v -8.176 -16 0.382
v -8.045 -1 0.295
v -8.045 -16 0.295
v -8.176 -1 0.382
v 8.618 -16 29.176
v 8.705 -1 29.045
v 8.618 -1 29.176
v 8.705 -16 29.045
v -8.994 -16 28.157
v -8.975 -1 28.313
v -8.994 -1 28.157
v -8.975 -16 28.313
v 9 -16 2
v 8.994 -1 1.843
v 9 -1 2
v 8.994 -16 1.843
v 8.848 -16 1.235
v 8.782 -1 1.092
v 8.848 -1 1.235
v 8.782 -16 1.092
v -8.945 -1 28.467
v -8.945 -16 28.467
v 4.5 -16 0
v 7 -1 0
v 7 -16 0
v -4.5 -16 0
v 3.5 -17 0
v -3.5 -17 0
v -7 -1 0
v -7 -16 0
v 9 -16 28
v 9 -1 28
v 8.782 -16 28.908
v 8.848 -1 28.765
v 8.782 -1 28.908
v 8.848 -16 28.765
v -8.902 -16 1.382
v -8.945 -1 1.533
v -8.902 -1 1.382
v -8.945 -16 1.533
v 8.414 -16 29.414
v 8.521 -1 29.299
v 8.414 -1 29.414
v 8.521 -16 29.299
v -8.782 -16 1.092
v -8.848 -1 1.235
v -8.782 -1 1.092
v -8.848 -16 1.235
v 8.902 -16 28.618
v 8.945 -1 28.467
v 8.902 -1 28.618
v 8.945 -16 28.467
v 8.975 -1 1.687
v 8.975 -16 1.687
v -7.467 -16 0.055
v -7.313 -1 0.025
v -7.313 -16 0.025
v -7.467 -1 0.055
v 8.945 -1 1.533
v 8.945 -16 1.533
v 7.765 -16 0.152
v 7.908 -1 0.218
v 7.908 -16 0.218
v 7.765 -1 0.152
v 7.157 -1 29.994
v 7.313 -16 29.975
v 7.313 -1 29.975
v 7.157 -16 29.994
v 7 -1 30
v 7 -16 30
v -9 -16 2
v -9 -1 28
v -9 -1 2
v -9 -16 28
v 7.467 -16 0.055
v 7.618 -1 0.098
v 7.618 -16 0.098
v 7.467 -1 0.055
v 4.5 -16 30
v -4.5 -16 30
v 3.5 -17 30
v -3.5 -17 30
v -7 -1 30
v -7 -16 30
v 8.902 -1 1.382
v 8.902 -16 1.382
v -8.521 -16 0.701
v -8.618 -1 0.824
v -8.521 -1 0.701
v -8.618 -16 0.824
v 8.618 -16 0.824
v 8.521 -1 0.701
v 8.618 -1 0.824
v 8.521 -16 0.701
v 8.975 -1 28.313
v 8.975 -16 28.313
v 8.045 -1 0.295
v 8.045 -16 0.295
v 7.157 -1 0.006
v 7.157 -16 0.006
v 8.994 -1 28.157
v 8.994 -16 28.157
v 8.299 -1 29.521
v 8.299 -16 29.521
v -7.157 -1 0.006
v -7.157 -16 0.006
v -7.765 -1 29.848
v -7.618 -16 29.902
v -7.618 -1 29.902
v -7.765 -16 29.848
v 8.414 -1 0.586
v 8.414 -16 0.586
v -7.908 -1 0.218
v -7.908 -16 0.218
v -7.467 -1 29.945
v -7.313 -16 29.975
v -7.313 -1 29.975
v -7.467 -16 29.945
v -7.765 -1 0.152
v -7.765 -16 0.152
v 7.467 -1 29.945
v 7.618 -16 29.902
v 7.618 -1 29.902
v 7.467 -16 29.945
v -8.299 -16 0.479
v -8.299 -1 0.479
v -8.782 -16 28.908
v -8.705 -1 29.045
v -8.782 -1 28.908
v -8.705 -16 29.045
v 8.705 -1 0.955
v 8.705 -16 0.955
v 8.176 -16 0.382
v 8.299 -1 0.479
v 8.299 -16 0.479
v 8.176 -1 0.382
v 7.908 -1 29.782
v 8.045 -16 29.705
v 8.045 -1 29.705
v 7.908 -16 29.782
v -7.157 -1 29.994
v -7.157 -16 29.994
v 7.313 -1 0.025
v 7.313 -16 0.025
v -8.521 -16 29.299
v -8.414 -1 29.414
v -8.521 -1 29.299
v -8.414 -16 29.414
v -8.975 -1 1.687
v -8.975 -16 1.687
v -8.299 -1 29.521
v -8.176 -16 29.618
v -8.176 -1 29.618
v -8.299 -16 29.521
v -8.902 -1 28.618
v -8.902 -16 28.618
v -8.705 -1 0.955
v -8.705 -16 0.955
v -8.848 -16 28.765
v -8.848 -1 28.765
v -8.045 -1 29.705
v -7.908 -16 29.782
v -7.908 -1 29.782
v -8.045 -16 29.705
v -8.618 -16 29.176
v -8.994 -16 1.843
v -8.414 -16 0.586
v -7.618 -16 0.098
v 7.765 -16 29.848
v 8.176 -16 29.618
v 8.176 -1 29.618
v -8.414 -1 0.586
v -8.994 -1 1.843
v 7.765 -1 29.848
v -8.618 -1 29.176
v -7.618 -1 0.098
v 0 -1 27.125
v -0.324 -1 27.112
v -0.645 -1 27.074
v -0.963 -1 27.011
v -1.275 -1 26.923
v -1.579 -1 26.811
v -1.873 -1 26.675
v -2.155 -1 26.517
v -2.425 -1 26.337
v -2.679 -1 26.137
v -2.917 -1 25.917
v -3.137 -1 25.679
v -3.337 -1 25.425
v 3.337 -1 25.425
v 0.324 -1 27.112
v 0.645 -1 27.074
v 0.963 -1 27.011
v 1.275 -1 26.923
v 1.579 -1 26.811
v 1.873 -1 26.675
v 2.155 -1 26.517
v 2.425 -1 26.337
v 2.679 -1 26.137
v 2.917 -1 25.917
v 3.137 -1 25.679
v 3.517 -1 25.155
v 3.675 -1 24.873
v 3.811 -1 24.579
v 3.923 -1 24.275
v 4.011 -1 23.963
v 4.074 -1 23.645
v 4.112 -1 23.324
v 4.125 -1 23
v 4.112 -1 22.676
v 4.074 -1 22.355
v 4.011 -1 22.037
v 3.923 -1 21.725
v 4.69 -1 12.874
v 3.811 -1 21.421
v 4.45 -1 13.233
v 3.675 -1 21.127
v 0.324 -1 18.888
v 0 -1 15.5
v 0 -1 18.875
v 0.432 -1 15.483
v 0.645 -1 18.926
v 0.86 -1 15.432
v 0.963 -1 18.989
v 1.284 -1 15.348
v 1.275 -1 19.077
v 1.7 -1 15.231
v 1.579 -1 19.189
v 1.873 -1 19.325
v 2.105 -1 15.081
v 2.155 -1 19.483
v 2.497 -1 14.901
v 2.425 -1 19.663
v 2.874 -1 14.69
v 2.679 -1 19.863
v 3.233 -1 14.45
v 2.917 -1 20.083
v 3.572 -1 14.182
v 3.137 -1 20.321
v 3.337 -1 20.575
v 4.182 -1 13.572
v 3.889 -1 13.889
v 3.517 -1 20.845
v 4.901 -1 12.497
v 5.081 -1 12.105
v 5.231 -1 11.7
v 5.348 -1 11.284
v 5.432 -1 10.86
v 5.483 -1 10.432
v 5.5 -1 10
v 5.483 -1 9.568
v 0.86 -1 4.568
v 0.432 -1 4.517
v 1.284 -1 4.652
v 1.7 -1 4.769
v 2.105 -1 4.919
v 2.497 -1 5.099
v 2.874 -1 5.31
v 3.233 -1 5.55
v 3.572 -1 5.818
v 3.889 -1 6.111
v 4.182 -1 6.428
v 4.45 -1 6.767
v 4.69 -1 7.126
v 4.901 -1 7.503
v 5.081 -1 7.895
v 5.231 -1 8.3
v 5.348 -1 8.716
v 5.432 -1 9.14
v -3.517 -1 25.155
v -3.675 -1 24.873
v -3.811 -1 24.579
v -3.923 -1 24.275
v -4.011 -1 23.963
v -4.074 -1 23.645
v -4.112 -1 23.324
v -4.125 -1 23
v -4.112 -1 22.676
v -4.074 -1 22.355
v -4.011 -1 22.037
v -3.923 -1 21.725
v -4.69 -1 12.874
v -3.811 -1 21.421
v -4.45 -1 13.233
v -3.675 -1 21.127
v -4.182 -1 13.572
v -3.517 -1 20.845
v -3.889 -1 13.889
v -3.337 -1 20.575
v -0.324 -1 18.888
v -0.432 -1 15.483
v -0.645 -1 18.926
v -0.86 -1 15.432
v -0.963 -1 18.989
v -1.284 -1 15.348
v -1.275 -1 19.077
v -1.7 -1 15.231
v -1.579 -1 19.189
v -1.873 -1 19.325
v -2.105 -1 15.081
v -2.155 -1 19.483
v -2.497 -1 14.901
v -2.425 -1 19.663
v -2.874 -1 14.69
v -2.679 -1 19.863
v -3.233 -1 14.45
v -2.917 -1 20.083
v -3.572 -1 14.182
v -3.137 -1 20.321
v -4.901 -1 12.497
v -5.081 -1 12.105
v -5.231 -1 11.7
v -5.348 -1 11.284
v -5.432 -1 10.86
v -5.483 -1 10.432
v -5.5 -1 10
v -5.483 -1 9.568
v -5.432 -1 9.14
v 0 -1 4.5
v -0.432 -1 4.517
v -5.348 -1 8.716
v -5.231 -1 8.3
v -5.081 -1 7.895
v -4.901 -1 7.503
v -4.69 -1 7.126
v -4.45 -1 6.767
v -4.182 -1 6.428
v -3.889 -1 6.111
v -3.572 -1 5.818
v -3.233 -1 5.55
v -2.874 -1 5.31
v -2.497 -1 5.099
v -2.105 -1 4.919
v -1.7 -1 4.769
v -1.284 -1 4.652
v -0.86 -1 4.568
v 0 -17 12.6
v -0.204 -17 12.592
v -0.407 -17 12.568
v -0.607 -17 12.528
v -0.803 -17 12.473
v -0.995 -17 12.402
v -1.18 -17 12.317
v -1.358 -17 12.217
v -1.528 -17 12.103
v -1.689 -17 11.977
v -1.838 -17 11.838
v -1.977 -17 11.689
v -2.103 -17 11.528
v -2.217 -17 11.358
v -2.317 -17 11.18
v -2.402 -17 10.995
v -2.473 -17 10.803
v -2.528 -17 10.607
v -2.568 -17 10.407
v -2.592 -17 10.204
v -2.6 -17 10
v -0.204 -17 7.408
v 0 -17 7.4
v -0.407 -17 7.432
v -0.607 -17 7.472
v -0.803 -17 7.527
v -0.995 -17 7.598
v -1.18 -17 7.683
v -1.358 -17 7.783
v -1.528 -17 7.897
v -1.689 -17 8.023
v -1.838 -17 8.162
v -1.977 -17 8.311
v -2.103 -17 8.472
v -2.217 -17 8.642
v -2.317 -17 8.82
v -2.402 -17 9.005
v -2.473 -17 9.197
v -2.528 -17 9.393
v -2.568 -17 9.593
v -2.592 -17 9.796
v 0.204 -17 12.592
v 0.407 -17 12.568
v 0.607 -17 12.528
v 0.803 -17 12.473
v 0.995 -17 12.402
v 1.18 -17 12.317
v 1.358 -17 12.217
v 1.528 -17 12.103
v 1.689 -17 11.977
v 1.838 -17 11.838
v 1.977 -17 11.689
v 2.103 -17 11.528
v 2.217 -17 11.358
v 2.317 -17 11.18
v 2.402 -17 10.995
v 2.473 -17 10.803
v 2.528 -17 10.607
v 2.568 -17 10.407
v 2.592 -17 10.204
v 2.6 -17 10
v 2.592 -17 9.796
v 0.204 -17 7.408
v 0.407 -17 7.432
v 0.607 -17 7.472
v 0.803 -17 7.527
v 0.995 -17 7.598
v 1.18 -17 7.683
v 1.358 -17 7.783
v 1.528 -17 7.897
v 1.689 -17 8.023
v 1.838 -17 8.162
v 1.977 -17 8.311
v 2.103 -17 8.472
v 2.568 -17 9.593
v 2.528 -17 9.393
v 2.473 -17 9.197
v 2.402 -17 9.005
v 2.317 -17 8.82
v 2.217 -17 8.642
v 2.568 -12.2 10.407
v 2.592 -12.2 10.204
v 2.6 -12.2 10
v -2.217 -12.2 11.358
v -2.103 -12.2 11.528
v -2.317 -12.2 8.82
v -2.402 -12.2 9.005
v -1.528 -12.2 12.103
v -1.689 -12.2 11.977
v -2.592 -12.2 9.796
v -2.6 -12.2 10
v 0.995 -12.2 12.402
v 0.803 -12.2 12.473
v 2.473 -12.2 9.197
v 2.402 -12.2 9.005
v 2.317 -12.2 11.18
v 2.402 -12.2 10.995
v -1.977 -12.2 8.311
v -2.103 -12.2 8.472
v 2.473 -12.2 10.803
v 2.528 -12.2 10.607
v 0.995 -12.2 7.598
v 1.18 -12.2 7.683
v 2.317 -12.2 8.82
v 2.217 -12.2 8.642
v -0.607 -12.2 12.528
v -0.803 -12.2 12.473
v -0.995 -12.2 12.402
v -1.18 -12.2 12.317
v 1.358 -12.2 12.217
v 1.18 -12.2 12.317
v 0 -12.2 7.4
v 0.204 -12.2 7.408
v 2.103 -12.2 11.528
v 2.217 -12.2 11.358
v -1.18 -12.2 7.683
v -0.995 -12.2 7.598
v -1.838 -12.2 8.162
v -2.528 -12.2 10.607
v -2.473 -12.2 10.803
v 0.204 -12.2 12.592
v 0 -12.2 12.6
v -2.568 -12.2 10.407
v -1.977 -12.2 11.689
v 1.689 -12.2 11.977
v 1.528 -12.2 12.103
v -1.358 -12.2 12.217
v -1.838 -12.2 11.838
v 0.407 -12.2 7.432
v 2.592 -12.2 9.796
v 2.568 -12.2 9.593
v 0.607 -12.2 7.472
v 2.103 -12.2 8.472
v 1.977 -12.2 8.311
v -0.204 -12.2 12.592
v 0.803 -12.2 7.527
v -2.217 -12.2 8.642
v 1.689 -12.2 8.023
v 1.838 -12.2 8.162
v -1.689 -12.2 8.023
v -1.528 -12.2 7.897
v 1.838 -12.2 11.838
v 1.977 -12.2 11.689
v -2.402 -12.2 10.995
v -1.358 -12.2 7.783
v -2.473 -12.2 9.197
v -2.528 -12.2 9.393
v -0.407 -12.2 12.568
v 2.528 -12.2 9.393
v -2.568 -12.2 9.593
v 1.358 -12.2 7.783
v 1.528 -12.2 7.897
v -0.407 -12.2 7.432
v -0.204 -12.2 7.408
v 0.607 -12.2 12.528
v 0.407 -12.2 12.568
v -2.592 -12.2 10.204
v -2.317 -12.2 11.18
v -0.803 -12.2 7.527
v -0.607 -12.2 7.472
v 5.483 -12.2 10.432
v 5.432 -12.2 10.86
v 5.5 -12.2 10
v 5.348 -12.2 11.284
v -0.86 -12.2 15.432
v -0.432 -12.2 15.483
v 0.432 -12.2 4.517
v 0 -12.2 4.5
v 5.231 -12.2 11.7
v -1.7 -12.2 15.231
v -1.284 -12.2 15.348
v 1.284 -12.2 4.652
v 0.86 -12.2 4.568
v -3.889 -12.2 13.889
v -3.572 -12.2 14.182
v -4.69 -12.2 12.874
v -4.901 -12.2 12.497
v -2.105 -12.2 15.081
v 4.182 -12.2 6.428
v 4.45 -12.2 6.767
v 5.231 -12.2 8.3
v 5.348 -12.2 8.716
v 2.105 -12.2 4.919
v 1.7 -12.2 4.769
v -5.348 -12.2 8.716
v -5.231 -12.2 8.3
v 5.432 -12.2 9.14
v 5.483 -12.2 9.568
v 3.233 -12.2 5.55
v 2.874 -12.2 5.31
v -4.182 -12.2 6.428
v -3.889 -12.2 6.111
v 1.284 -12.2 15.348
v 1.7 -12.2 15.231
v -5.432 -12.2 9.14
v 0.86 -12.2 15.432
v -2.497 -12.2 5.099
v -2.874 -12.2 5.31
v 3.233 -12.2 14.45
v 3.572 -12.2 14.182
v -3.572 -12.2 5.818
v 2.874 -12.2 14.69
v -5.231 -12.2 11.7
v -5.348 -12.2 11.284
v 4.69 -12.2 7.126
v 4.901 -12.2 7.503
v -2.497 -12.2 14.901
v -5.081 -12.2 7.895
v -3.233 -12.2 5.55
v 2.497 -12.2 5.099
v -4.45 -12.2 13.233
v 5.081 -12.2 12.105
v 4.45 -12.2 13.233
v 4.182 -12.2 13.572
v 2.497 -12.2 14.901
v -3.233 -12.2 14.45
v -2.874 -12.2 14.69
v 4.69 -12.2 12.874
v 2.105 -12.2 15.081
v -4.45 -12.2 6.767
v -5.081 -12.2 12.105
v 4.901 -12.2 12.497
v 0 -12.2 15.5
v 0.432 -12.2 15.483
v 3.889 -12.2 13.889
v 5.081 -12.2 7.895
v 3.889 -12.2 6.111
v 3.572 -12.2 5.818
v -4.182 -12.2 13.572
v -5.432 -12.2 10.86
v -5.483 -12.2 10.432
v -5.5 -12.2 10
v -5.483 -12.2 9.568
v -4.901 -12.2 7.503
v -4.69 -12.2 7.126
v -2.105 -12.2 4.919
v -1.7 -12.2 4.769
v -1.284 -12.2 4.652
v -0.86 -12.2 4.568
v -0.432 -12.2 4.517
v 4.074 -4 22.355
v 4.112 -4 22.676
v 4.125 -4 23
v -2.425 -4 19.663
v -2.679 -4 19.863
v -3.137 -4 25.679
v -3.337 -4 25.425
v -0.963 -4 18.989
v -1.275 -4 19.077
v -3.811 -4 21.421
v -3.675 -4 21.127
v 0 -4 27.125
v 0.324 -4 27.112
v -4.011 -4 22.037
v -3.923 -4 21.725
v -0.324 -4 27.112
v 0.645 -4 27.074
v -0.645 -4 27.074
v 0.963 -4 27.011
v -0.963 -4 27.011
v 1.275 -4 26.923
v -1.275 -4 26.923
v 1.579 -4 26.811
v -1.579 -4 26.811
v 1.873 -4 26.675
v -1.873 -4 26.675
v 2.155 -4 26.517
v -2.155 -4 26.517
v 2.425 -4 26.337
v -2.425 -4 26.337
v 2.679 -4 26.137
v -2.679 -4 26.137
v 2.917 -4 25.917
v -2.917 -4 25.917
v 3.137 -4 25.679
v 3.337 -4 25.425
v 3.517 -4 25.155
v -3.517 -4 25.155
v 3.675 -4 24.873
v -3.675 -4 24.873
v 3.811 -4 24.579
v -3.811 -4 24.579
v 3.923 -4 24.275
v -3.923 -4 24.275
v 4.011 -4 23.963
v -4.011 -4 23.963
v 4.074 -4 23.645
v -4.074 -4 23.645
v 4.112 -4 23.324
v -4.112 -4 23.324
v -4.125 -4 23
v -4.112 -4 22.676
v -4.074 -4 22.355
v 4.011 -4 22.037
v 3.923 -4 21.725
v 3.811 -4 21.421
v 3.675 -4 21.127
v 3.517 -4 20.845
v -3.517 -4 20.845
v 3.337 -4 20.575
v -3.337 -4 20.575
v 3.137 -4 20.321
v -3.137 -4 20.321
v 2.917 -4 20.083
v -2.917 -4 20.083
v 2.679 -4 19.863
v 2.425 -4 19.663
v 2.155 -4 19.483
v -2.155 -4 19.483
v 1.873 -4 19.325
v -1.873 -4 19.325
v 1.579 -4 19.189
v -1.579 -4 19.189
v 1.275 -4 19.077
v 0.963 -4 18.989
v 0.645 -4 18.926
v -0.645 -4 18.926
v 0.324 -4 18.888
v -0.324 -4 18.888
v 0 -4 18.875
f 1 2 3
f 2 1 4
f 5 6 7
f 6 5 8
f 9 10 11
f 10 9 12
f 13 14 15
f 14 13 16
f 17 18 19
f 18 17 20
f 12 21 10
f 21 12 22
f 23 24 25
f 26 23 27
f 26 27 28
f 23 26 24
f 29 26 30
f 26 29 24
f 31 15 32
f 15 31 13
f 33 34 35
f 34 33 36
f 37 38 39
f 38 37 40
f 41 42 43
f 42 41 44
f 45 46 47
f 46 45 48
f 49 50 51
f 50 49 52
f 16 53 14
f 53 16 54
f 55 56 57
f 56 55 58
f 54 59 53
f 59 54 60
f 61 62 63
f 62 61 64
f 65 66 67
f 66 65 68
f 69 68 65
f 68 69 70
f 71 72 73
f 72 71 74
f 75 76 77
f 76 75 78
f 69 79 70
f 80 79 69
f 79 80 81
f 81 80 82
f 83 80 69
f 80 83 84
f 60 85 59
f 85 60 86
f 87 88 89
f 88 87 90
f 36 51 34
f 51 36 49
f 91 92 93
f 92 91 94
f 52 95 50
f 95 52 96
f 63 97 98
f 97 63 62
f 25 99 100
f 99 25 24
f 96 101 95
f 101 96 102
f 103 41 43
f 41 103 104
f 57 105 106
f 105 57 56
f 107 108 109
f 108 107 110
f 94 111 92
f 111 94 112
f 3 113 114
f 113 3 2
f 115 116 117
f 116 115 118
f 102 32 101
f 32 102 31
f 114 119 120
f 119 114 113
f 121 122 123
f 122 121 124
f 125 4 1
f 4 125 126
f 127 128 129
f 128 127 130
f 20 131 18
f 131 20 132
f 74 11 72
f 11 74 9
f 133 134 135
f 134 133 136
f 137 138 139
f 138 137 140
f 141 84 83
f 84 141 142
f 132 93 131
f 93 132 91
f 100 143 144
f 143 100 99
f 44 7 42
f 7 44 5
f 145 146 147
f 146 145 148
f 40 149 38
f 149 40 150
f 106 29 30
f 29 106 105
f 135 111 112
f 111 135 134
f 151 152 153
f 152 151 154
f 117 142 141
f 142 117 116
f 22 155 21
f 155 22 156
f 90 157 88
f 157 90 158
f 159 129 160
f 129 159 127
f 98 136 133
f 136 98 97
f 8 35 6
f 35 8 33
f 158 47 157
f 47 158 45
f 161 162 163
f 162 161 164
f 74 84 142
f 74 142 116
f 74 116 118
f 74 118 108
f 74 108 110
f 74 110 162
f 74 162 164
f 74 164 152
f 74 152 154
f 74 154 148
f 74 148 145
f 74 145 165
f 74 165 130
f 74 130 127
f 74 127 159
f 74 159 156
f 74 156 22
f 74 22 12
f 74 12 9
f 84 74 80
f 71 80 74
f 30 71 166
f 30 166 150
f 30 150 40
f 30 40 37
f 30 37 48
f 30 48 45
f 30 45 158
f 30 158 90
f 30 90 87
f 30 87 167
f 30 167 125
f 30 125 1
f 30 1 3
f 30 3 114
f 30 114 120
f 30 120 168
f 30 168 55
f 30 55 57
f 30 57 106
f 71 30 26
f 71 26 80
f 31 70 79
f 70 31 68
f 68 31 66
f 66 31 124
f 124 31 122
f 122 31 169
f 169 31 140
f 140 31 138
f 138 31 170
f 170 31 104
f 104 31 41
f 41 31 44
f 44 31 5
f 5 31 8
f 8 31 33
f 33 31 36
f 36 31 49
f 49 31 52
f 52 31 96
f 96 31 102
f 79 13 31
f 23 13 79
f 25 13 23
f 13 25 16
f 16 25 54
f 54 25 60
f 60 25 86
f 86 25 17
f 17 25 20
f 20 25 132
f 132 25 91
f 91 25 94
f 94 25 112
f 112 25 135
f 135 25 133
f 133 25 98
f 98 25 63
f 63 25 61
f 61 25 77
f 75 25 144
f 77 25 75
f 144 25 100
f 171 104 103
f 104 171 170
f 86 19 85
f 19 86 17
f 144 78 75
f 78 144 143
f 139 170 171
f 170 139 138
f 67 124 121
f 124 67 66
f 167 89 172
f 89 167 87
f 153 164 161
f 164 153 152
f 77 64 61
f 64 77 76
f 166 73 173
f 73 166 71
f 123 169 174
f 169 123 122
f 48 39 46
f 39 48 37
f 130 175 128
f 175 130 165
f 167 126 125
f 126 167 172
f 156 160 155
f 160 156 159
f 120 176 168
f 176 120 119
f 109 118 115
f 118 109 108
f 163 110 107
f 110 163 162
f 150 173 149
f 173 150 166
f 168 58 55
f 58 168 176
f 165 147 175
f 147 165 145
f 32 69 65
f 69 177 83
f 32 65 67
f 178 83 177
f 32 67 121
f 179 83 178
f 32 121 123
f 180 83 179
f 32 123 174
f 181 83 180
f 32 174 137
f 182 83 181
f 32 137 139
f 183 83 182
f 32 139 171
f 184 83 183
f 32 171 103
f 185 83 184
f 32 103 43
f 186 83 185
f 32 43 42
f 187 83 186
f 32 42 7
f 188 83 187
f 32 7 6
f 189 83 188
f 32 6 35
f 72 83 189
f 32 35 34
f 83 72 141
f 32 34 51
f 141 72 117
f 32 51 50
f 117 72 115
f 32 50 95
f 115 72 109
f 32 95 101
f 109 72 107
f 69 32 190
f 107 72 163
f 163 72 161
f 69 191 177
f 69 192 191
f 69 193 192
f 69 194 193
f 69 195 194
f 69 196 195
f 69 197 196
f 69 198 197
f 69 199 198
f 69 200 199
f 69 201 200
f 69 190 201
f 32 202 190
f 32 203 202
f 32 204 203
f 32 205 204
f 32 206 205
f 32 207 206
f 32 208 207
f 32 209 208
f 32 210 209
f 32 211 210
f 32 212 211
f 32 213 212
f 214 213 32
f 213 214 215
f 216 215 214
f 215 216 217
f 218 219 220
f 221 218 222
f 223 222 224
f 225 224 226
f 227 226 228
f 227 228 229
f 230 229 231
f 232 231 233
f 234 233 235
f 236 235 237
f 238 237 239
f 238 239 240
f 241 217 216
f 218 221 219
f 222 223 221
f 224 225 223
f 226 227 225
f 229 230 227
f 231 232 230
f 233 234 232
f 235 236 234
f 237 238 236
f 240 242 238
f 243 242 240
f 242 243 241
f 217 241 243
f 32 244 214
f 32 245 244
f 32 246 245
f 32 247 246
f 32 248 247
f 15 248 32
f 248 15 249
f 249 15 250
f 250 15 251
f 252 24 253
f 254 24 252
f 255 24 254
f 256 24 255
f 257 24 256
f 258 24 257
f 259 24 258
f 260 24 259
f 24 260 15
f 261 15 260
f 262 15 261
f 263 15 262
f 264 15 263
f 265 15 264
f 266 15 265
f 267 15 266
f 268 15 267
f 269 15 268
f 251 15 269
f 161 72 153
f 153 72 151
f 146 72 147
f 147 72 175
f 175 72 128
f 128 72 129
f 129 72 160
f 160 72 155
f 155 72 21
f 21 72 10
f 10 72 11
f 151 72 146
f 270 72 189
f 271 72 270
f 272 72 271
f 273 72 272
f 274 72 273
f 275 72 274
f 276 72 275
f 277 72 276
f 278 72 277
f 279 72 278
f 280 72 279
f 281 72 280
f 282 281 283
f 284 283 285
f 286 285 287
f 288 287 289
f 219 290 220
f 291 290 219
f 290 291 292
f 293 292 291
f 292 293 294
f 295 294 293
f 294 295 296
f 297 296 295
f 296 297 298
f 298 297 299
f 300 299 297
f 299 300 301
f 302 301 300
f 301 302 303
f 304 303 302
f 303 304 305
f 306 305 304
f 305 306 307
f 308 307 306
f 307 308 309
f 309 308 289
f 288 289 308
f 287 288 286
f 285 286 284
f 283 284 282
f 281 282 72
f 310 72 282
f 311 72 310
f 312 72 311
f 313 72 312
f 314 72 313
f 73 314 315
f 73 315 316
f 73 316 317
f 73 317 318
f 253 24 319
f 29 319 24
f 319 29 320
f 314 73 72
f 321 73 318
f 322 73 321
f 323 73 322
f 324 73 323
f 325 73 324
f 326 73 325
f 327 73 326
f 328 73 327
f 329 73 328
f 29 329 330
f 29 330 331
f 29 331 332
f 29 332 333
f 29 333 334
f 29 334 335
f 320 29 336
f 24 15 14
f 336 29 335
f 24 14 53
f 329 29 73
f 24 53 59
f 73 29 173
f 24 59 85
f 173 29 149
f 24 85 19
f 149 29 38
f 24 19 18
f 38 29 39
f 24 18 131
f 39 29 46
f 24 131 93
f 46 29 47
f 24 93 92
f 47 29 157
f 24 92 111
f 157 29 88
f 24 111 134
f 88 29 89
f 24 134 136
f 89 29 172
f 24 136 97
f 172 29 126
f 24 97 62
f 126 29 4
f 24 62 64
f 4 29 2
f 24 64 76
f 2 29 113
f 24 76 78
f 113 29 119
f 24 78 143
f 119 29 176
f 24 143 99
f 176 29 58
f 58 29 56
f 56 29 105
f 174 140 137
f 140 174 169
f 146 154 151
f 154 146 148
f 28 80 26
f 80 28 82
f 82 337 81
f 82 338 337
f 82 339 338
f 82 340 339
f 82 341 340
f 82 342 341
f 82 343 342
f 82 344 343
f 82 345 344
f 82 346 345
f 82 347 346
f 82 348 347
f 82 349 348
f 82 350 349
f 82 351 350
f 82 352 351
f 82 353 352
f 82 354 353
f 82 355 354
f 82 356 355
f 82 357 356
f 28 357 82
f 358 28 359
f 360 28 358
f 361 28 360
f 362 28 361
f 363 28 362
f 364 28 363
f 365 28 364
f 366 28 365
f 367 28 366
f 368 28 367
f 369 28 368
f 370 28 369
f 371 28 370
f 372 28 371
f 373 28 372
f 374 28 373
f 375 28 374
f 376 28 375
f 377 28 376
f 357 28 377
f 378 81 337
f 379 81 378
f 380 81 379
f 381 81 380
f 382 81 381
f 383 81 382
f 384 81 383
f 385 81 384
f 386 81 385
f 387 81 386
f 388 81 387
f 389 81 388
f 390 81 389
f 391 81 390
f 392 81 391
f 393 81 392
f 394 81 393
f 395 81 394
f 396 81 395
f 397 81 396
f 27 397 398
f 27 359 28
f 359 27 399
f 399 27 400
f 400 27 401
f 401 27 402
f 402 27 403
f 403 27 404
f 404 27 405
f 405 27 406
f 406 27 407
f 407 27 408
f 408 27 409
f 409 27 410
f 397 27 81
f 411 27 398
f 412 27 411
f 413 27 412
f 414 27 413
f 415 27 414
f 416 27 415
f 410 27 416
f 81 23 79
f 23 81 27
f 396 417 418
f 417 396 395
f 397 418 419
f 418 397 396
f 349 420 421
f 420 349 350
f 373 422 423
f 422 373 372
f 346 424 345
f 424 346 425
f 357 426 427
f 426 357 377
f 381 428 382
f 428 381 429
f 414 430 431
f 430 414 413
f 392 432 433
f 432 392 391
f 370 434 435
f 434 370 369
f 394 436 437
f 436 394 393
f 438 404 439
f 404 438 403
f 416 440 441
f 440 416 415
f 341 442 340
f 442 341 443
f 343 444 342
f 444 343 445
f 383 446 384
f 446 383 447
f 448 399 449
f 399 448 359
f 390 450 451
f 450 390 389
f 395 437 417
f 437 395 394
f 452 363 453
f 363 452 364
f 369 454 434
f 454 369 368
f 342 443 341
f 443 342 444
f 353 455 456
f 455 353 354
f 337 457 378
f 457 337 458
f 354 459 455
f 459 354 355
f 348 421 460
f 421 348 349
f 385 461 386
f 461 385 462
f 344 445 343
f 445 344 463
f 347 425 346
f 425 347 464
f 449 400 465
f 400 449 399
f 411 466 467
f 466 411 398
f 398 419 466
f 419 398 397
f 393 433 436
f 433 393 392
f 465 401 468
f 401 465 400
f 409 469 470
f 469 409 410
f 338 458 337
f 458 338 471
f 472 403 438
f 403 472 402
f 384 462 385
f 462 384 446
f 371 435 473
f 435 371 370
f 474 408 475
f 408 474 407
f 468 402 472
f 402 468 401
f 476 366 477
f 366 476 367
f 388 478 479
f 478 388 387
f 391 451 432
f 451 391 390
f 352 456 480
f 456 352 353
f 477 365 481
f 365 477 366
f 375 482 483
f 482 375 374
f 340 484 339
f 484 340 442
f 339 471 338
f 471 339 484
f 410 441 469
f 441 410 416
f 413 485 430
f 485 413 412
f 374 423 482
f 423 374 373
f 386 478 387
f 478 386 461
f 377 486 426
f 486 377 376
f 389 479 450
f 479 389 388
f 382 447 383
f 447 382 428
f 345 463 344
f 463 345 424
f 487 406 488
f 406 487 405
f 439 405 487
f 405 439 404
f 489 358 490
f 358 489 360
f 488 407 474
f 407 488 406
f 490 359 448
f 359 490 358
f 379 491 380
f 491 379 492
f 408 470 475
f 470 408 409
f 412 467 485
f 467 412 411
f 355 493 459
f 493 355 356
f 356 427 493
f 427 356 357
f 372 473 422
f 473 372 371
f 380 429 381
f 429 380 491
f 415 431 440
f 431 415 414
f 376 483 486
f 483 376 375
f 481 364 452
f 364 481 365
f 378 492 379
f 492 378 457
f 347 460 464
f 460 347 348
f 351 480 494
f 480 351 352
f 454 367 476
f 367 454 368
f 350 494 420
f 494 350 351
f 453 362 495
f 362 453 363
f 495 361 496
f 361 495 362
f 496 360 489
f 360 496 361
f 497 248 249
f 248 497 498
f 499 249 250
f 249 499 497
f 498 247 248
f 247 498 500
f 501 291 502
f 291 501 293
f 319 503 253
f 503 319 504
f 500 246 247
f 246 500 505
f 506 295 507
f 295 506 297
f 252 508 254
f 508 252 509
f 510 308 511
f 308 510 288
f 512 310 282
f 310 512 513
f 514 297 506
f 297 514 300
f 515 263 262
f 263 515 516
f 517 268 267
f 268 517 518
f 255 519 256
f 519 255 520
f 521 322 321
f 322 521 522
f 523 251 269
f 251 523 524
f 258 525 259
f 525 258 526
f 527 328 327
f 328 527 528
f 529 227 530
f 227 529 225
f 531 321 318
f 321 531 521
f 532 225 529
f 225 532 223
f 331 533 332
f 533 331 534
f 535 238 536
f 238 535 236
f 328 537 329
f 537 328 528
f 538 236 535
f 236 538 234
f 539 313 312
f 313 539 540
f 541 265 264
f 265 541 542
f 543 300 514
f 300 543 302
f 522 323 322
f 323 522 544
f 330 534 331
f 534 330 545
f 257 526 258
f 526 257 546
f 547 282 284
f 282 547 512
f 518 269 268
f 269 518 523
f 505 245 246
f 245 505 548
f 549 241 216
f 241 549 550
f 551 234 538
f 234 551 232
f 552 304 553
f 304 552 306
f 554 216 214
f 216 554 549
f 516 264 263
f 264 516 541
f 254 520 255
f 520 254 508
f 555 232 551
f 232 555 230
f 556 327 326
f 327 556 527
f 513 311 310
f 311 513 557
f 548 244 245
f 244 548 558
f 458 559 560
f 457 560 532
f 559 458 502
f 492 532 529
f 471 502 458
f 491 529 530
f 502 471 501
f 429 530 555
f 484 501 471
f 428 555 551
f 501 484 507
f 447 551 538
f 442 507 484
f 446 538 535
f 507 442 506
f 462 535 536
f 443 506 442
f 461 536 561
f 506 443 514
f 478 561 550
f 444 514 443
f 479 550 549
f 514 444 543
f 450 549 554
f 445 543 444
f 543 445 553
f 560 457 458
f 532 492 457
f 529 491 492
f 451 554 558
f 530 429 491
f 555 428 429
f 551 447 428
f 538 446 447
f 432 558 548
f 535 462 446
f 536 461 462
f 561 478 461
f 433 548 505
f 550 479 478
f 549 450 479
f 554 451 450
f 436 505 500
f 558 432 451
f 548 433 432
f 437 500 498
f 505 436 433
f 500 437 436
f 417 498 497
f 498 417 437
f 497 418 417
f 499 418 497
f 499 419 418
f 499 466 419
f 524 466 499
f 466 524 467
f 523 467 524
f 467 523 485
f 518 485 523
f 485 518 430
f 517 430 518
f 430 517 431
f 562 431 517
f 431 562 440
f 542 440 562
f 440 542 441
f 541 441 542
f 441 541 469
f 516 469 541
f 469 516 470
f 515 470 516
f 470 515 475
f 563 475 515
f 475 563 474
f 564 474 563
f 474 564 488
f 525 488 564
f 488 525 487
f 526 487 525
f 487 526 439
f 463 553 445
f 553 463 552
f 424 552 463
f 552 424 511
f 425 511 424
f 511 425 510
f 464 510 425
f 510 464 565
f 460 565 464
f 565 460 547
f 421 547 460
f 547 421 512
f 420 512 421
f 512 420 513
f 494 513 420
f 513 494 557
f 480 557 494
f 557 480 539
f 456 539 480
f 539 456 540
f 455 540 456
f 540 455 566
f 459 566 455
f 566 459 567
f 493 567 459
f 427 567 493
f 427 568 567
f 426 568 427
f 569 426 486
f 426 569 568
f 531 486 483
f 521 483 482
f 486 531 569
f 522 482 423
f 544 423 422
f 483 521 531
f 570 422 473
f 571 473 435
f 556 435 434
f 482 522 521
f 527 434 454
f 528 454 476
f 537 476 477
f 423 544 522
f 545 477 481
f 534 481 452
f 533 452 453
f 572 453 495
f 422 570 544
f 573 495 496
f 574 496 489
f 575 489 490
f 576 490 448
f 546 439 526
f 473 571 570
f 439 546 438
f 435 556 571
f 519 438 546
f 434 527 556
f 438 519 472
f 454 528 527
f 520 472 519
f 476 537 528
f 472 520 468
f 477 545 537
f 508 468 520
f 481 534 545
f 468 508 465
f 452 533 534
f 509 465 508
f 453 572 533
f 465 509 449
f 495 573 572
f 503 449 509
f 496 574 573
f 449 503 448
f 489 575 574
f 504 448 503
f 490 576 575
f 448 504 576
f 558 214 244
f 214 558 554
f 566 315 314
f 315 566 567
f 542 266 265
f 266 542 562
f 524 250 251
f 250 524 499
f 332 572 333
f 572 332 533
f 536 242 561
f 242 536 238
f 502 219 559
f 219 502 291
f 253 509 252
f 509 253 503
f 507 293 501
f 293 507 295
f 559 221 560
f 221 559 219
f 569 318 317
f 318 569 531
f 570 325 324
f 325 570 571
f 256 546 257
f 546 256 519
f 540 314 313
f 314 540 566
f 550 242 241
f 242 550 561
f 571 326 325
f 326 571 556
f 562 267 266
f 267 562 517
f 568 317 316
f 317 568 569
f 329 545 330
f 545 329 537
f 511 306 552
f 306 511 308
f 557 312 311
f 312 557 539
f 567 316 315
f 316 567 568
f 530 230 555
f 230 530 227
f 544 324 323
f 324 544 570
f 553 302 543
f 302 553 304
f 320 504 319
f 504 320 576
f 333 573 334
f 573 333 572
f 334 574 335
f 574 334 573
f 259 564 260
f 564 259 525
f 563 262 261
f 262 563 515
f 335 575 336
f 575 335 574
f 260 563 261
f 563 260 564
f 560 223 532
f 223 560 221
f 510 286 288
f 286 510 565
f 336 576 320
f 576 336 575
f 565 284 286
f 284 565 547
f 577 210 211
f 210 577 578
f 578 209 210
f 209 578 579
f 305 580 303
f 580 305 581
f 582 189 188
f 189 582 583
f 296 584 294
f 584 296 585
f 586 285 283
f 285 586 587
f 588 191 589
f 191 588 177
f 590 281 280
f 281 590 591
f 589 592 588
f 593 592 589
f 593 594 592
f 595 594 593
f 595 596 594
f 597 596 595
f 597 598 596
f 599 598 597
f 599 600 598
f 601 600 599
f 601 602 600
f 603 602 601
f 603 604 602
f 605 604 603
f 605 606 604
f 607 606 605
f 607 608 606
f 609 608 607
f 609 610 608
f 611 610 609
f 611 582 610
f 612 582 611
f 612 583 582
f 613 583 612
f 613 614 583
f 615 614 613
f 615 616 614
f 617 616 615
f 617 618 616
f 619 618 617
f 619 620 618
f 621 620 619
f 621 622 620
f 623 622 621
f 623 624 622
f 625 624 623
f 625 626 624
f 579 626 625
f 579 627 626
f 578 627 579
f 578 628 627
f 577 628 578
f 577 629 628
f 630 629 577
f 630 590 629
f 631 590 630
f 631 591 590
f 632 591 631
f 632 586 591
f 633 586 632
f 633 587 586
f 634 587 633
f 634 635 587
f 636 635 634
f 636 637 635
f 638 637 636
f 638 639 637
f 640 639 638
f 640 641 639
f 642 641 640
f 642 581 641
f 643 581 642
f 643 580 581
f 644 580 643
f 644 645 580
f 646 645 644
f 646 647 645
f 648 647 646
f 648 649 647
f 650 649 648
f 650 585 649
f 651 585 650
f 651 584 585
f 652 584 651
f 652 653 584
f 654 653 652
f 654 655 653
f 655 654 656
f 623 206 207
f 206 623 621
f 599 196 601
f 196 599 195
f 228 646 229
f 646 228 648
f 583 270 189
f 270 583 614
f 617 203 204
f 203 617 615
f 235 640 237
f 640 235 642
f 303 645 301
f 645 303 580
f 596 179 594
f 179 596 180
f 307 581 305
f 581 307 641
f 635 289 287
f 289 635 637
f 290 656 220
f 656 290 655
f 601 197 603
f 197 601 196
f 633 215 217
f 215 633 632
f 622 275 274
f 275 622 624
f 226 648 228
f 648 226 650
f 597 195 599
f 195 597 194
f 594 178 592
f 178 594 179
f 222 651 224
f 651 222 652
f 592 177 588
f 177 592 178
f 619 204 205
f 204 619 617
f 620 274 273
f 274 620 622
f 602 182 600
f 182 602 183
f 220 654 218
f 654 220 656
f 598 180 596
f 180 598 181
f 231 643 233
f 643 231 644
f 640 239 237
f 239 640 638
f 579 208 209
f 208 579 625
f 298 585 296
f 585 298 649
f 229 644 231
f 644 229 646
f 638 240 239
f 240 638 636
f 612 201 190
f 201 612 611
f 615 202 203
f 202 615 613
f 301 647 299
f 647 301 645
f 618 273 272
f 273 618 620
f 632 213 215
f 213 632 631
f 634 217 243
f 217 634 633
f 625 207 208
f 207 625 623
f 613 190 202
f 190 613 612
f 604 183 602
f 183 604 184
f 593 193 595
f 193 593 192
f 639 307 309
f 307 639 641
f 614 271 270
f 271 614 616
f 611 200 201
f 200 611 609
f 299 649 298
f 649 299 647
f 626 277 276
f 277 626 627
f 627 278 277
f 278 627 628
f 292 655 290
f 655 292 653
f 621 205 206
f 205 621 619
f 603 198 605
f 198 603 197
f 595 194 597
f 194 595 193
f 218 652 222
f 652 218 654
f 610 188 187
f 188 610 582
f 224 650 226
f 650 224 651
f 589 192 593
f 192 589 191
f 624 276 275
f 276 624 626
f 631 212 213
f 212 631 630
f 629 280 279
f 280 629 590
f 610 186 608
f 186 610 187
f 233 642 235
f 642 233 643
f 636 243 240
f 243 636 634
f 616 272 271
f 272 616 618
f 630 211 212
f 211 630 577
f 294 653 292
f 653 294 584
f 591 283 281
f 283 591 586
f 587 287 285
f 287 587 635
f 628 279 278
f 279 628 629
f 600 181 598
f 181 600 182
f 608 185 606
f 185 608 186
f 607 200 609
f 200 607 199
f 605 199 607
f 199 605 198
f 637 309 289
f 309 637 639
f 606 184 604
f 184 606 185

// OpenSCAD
$fn=80;

bottomLip = 0;
thick = 7+8; /* minimum 7, add 8 to fit on the front */
magnetDepth = 3;
magnetDia = 8.25; /* include any slop */
len = 30;


/* note: need 4mm of thickness of form for 10mm bolts to work */
/* note: this file is a total mess. not sure how it got to this point. */

difference() {
   union() {
      translate([-15,-16,0]) {
         hull() {
            /* translate([5,0,0]) cube([20,10,len + 6*bottomLip]); */

            translate([7,0,2]) hull() {
               translate([15,0,0]) rotate([-90,0,0]) cylinder(r=2,h=thick);
               translate([1,0,0]) rotate([-90,0,0]) cylinder(r=2,h=thick);
               translate([15,0,len-4 + 6*bottomLip ]) rotate([-90,0,0]) cylinder(r=2,h=thick);
               translate([1,0, len-4 + 6*bottomLip]) rotate([-90,0,0]) cylinder(r=2,h=thick);
            }
         }

         /* angled bit to fit in v-slot */
         translate([19.5,0,0]) rotate([0,0,180])
            linear_extrude(height=len + 6*bottomLip)
            polygon(points=[[-0.1,0],[0,0],[1,1],[8,1],[9,0],[9,-0.1]]);
         
         /* bottom lip */
         if (bottomLip) {
            translate([7,thick-1,len+6*bottomLip-2]) hull() {
               translate([2,0,0]) cylinder(r=2,h=2);
               translate([2,5,0]) cylinder(r=2,h=2);
               translate([14,0,0]) cylinder(r=2,h=2);
               translate([14,5,0]) cylinder(r=2,h=2);
            }
         }

      }
   }

   /* bolt */
   translate([0,-2.2,10]) rotate([90,0,0]) {
      /* bolt hole */
      translate([0,0,14-4.8]) cylinder(h=15,d=5.2);

      /* cap holes (with a little gap to allow bridging) */
      translate([0,0,-20]) cylinder(h=30,d=11);

   }

   /* cutout for magnet */
   translate([0,-14+thick-magnetDepth-2, 23]) rotate([-90,0,0]) cylinder(d=magnetDia, h=20);
}
